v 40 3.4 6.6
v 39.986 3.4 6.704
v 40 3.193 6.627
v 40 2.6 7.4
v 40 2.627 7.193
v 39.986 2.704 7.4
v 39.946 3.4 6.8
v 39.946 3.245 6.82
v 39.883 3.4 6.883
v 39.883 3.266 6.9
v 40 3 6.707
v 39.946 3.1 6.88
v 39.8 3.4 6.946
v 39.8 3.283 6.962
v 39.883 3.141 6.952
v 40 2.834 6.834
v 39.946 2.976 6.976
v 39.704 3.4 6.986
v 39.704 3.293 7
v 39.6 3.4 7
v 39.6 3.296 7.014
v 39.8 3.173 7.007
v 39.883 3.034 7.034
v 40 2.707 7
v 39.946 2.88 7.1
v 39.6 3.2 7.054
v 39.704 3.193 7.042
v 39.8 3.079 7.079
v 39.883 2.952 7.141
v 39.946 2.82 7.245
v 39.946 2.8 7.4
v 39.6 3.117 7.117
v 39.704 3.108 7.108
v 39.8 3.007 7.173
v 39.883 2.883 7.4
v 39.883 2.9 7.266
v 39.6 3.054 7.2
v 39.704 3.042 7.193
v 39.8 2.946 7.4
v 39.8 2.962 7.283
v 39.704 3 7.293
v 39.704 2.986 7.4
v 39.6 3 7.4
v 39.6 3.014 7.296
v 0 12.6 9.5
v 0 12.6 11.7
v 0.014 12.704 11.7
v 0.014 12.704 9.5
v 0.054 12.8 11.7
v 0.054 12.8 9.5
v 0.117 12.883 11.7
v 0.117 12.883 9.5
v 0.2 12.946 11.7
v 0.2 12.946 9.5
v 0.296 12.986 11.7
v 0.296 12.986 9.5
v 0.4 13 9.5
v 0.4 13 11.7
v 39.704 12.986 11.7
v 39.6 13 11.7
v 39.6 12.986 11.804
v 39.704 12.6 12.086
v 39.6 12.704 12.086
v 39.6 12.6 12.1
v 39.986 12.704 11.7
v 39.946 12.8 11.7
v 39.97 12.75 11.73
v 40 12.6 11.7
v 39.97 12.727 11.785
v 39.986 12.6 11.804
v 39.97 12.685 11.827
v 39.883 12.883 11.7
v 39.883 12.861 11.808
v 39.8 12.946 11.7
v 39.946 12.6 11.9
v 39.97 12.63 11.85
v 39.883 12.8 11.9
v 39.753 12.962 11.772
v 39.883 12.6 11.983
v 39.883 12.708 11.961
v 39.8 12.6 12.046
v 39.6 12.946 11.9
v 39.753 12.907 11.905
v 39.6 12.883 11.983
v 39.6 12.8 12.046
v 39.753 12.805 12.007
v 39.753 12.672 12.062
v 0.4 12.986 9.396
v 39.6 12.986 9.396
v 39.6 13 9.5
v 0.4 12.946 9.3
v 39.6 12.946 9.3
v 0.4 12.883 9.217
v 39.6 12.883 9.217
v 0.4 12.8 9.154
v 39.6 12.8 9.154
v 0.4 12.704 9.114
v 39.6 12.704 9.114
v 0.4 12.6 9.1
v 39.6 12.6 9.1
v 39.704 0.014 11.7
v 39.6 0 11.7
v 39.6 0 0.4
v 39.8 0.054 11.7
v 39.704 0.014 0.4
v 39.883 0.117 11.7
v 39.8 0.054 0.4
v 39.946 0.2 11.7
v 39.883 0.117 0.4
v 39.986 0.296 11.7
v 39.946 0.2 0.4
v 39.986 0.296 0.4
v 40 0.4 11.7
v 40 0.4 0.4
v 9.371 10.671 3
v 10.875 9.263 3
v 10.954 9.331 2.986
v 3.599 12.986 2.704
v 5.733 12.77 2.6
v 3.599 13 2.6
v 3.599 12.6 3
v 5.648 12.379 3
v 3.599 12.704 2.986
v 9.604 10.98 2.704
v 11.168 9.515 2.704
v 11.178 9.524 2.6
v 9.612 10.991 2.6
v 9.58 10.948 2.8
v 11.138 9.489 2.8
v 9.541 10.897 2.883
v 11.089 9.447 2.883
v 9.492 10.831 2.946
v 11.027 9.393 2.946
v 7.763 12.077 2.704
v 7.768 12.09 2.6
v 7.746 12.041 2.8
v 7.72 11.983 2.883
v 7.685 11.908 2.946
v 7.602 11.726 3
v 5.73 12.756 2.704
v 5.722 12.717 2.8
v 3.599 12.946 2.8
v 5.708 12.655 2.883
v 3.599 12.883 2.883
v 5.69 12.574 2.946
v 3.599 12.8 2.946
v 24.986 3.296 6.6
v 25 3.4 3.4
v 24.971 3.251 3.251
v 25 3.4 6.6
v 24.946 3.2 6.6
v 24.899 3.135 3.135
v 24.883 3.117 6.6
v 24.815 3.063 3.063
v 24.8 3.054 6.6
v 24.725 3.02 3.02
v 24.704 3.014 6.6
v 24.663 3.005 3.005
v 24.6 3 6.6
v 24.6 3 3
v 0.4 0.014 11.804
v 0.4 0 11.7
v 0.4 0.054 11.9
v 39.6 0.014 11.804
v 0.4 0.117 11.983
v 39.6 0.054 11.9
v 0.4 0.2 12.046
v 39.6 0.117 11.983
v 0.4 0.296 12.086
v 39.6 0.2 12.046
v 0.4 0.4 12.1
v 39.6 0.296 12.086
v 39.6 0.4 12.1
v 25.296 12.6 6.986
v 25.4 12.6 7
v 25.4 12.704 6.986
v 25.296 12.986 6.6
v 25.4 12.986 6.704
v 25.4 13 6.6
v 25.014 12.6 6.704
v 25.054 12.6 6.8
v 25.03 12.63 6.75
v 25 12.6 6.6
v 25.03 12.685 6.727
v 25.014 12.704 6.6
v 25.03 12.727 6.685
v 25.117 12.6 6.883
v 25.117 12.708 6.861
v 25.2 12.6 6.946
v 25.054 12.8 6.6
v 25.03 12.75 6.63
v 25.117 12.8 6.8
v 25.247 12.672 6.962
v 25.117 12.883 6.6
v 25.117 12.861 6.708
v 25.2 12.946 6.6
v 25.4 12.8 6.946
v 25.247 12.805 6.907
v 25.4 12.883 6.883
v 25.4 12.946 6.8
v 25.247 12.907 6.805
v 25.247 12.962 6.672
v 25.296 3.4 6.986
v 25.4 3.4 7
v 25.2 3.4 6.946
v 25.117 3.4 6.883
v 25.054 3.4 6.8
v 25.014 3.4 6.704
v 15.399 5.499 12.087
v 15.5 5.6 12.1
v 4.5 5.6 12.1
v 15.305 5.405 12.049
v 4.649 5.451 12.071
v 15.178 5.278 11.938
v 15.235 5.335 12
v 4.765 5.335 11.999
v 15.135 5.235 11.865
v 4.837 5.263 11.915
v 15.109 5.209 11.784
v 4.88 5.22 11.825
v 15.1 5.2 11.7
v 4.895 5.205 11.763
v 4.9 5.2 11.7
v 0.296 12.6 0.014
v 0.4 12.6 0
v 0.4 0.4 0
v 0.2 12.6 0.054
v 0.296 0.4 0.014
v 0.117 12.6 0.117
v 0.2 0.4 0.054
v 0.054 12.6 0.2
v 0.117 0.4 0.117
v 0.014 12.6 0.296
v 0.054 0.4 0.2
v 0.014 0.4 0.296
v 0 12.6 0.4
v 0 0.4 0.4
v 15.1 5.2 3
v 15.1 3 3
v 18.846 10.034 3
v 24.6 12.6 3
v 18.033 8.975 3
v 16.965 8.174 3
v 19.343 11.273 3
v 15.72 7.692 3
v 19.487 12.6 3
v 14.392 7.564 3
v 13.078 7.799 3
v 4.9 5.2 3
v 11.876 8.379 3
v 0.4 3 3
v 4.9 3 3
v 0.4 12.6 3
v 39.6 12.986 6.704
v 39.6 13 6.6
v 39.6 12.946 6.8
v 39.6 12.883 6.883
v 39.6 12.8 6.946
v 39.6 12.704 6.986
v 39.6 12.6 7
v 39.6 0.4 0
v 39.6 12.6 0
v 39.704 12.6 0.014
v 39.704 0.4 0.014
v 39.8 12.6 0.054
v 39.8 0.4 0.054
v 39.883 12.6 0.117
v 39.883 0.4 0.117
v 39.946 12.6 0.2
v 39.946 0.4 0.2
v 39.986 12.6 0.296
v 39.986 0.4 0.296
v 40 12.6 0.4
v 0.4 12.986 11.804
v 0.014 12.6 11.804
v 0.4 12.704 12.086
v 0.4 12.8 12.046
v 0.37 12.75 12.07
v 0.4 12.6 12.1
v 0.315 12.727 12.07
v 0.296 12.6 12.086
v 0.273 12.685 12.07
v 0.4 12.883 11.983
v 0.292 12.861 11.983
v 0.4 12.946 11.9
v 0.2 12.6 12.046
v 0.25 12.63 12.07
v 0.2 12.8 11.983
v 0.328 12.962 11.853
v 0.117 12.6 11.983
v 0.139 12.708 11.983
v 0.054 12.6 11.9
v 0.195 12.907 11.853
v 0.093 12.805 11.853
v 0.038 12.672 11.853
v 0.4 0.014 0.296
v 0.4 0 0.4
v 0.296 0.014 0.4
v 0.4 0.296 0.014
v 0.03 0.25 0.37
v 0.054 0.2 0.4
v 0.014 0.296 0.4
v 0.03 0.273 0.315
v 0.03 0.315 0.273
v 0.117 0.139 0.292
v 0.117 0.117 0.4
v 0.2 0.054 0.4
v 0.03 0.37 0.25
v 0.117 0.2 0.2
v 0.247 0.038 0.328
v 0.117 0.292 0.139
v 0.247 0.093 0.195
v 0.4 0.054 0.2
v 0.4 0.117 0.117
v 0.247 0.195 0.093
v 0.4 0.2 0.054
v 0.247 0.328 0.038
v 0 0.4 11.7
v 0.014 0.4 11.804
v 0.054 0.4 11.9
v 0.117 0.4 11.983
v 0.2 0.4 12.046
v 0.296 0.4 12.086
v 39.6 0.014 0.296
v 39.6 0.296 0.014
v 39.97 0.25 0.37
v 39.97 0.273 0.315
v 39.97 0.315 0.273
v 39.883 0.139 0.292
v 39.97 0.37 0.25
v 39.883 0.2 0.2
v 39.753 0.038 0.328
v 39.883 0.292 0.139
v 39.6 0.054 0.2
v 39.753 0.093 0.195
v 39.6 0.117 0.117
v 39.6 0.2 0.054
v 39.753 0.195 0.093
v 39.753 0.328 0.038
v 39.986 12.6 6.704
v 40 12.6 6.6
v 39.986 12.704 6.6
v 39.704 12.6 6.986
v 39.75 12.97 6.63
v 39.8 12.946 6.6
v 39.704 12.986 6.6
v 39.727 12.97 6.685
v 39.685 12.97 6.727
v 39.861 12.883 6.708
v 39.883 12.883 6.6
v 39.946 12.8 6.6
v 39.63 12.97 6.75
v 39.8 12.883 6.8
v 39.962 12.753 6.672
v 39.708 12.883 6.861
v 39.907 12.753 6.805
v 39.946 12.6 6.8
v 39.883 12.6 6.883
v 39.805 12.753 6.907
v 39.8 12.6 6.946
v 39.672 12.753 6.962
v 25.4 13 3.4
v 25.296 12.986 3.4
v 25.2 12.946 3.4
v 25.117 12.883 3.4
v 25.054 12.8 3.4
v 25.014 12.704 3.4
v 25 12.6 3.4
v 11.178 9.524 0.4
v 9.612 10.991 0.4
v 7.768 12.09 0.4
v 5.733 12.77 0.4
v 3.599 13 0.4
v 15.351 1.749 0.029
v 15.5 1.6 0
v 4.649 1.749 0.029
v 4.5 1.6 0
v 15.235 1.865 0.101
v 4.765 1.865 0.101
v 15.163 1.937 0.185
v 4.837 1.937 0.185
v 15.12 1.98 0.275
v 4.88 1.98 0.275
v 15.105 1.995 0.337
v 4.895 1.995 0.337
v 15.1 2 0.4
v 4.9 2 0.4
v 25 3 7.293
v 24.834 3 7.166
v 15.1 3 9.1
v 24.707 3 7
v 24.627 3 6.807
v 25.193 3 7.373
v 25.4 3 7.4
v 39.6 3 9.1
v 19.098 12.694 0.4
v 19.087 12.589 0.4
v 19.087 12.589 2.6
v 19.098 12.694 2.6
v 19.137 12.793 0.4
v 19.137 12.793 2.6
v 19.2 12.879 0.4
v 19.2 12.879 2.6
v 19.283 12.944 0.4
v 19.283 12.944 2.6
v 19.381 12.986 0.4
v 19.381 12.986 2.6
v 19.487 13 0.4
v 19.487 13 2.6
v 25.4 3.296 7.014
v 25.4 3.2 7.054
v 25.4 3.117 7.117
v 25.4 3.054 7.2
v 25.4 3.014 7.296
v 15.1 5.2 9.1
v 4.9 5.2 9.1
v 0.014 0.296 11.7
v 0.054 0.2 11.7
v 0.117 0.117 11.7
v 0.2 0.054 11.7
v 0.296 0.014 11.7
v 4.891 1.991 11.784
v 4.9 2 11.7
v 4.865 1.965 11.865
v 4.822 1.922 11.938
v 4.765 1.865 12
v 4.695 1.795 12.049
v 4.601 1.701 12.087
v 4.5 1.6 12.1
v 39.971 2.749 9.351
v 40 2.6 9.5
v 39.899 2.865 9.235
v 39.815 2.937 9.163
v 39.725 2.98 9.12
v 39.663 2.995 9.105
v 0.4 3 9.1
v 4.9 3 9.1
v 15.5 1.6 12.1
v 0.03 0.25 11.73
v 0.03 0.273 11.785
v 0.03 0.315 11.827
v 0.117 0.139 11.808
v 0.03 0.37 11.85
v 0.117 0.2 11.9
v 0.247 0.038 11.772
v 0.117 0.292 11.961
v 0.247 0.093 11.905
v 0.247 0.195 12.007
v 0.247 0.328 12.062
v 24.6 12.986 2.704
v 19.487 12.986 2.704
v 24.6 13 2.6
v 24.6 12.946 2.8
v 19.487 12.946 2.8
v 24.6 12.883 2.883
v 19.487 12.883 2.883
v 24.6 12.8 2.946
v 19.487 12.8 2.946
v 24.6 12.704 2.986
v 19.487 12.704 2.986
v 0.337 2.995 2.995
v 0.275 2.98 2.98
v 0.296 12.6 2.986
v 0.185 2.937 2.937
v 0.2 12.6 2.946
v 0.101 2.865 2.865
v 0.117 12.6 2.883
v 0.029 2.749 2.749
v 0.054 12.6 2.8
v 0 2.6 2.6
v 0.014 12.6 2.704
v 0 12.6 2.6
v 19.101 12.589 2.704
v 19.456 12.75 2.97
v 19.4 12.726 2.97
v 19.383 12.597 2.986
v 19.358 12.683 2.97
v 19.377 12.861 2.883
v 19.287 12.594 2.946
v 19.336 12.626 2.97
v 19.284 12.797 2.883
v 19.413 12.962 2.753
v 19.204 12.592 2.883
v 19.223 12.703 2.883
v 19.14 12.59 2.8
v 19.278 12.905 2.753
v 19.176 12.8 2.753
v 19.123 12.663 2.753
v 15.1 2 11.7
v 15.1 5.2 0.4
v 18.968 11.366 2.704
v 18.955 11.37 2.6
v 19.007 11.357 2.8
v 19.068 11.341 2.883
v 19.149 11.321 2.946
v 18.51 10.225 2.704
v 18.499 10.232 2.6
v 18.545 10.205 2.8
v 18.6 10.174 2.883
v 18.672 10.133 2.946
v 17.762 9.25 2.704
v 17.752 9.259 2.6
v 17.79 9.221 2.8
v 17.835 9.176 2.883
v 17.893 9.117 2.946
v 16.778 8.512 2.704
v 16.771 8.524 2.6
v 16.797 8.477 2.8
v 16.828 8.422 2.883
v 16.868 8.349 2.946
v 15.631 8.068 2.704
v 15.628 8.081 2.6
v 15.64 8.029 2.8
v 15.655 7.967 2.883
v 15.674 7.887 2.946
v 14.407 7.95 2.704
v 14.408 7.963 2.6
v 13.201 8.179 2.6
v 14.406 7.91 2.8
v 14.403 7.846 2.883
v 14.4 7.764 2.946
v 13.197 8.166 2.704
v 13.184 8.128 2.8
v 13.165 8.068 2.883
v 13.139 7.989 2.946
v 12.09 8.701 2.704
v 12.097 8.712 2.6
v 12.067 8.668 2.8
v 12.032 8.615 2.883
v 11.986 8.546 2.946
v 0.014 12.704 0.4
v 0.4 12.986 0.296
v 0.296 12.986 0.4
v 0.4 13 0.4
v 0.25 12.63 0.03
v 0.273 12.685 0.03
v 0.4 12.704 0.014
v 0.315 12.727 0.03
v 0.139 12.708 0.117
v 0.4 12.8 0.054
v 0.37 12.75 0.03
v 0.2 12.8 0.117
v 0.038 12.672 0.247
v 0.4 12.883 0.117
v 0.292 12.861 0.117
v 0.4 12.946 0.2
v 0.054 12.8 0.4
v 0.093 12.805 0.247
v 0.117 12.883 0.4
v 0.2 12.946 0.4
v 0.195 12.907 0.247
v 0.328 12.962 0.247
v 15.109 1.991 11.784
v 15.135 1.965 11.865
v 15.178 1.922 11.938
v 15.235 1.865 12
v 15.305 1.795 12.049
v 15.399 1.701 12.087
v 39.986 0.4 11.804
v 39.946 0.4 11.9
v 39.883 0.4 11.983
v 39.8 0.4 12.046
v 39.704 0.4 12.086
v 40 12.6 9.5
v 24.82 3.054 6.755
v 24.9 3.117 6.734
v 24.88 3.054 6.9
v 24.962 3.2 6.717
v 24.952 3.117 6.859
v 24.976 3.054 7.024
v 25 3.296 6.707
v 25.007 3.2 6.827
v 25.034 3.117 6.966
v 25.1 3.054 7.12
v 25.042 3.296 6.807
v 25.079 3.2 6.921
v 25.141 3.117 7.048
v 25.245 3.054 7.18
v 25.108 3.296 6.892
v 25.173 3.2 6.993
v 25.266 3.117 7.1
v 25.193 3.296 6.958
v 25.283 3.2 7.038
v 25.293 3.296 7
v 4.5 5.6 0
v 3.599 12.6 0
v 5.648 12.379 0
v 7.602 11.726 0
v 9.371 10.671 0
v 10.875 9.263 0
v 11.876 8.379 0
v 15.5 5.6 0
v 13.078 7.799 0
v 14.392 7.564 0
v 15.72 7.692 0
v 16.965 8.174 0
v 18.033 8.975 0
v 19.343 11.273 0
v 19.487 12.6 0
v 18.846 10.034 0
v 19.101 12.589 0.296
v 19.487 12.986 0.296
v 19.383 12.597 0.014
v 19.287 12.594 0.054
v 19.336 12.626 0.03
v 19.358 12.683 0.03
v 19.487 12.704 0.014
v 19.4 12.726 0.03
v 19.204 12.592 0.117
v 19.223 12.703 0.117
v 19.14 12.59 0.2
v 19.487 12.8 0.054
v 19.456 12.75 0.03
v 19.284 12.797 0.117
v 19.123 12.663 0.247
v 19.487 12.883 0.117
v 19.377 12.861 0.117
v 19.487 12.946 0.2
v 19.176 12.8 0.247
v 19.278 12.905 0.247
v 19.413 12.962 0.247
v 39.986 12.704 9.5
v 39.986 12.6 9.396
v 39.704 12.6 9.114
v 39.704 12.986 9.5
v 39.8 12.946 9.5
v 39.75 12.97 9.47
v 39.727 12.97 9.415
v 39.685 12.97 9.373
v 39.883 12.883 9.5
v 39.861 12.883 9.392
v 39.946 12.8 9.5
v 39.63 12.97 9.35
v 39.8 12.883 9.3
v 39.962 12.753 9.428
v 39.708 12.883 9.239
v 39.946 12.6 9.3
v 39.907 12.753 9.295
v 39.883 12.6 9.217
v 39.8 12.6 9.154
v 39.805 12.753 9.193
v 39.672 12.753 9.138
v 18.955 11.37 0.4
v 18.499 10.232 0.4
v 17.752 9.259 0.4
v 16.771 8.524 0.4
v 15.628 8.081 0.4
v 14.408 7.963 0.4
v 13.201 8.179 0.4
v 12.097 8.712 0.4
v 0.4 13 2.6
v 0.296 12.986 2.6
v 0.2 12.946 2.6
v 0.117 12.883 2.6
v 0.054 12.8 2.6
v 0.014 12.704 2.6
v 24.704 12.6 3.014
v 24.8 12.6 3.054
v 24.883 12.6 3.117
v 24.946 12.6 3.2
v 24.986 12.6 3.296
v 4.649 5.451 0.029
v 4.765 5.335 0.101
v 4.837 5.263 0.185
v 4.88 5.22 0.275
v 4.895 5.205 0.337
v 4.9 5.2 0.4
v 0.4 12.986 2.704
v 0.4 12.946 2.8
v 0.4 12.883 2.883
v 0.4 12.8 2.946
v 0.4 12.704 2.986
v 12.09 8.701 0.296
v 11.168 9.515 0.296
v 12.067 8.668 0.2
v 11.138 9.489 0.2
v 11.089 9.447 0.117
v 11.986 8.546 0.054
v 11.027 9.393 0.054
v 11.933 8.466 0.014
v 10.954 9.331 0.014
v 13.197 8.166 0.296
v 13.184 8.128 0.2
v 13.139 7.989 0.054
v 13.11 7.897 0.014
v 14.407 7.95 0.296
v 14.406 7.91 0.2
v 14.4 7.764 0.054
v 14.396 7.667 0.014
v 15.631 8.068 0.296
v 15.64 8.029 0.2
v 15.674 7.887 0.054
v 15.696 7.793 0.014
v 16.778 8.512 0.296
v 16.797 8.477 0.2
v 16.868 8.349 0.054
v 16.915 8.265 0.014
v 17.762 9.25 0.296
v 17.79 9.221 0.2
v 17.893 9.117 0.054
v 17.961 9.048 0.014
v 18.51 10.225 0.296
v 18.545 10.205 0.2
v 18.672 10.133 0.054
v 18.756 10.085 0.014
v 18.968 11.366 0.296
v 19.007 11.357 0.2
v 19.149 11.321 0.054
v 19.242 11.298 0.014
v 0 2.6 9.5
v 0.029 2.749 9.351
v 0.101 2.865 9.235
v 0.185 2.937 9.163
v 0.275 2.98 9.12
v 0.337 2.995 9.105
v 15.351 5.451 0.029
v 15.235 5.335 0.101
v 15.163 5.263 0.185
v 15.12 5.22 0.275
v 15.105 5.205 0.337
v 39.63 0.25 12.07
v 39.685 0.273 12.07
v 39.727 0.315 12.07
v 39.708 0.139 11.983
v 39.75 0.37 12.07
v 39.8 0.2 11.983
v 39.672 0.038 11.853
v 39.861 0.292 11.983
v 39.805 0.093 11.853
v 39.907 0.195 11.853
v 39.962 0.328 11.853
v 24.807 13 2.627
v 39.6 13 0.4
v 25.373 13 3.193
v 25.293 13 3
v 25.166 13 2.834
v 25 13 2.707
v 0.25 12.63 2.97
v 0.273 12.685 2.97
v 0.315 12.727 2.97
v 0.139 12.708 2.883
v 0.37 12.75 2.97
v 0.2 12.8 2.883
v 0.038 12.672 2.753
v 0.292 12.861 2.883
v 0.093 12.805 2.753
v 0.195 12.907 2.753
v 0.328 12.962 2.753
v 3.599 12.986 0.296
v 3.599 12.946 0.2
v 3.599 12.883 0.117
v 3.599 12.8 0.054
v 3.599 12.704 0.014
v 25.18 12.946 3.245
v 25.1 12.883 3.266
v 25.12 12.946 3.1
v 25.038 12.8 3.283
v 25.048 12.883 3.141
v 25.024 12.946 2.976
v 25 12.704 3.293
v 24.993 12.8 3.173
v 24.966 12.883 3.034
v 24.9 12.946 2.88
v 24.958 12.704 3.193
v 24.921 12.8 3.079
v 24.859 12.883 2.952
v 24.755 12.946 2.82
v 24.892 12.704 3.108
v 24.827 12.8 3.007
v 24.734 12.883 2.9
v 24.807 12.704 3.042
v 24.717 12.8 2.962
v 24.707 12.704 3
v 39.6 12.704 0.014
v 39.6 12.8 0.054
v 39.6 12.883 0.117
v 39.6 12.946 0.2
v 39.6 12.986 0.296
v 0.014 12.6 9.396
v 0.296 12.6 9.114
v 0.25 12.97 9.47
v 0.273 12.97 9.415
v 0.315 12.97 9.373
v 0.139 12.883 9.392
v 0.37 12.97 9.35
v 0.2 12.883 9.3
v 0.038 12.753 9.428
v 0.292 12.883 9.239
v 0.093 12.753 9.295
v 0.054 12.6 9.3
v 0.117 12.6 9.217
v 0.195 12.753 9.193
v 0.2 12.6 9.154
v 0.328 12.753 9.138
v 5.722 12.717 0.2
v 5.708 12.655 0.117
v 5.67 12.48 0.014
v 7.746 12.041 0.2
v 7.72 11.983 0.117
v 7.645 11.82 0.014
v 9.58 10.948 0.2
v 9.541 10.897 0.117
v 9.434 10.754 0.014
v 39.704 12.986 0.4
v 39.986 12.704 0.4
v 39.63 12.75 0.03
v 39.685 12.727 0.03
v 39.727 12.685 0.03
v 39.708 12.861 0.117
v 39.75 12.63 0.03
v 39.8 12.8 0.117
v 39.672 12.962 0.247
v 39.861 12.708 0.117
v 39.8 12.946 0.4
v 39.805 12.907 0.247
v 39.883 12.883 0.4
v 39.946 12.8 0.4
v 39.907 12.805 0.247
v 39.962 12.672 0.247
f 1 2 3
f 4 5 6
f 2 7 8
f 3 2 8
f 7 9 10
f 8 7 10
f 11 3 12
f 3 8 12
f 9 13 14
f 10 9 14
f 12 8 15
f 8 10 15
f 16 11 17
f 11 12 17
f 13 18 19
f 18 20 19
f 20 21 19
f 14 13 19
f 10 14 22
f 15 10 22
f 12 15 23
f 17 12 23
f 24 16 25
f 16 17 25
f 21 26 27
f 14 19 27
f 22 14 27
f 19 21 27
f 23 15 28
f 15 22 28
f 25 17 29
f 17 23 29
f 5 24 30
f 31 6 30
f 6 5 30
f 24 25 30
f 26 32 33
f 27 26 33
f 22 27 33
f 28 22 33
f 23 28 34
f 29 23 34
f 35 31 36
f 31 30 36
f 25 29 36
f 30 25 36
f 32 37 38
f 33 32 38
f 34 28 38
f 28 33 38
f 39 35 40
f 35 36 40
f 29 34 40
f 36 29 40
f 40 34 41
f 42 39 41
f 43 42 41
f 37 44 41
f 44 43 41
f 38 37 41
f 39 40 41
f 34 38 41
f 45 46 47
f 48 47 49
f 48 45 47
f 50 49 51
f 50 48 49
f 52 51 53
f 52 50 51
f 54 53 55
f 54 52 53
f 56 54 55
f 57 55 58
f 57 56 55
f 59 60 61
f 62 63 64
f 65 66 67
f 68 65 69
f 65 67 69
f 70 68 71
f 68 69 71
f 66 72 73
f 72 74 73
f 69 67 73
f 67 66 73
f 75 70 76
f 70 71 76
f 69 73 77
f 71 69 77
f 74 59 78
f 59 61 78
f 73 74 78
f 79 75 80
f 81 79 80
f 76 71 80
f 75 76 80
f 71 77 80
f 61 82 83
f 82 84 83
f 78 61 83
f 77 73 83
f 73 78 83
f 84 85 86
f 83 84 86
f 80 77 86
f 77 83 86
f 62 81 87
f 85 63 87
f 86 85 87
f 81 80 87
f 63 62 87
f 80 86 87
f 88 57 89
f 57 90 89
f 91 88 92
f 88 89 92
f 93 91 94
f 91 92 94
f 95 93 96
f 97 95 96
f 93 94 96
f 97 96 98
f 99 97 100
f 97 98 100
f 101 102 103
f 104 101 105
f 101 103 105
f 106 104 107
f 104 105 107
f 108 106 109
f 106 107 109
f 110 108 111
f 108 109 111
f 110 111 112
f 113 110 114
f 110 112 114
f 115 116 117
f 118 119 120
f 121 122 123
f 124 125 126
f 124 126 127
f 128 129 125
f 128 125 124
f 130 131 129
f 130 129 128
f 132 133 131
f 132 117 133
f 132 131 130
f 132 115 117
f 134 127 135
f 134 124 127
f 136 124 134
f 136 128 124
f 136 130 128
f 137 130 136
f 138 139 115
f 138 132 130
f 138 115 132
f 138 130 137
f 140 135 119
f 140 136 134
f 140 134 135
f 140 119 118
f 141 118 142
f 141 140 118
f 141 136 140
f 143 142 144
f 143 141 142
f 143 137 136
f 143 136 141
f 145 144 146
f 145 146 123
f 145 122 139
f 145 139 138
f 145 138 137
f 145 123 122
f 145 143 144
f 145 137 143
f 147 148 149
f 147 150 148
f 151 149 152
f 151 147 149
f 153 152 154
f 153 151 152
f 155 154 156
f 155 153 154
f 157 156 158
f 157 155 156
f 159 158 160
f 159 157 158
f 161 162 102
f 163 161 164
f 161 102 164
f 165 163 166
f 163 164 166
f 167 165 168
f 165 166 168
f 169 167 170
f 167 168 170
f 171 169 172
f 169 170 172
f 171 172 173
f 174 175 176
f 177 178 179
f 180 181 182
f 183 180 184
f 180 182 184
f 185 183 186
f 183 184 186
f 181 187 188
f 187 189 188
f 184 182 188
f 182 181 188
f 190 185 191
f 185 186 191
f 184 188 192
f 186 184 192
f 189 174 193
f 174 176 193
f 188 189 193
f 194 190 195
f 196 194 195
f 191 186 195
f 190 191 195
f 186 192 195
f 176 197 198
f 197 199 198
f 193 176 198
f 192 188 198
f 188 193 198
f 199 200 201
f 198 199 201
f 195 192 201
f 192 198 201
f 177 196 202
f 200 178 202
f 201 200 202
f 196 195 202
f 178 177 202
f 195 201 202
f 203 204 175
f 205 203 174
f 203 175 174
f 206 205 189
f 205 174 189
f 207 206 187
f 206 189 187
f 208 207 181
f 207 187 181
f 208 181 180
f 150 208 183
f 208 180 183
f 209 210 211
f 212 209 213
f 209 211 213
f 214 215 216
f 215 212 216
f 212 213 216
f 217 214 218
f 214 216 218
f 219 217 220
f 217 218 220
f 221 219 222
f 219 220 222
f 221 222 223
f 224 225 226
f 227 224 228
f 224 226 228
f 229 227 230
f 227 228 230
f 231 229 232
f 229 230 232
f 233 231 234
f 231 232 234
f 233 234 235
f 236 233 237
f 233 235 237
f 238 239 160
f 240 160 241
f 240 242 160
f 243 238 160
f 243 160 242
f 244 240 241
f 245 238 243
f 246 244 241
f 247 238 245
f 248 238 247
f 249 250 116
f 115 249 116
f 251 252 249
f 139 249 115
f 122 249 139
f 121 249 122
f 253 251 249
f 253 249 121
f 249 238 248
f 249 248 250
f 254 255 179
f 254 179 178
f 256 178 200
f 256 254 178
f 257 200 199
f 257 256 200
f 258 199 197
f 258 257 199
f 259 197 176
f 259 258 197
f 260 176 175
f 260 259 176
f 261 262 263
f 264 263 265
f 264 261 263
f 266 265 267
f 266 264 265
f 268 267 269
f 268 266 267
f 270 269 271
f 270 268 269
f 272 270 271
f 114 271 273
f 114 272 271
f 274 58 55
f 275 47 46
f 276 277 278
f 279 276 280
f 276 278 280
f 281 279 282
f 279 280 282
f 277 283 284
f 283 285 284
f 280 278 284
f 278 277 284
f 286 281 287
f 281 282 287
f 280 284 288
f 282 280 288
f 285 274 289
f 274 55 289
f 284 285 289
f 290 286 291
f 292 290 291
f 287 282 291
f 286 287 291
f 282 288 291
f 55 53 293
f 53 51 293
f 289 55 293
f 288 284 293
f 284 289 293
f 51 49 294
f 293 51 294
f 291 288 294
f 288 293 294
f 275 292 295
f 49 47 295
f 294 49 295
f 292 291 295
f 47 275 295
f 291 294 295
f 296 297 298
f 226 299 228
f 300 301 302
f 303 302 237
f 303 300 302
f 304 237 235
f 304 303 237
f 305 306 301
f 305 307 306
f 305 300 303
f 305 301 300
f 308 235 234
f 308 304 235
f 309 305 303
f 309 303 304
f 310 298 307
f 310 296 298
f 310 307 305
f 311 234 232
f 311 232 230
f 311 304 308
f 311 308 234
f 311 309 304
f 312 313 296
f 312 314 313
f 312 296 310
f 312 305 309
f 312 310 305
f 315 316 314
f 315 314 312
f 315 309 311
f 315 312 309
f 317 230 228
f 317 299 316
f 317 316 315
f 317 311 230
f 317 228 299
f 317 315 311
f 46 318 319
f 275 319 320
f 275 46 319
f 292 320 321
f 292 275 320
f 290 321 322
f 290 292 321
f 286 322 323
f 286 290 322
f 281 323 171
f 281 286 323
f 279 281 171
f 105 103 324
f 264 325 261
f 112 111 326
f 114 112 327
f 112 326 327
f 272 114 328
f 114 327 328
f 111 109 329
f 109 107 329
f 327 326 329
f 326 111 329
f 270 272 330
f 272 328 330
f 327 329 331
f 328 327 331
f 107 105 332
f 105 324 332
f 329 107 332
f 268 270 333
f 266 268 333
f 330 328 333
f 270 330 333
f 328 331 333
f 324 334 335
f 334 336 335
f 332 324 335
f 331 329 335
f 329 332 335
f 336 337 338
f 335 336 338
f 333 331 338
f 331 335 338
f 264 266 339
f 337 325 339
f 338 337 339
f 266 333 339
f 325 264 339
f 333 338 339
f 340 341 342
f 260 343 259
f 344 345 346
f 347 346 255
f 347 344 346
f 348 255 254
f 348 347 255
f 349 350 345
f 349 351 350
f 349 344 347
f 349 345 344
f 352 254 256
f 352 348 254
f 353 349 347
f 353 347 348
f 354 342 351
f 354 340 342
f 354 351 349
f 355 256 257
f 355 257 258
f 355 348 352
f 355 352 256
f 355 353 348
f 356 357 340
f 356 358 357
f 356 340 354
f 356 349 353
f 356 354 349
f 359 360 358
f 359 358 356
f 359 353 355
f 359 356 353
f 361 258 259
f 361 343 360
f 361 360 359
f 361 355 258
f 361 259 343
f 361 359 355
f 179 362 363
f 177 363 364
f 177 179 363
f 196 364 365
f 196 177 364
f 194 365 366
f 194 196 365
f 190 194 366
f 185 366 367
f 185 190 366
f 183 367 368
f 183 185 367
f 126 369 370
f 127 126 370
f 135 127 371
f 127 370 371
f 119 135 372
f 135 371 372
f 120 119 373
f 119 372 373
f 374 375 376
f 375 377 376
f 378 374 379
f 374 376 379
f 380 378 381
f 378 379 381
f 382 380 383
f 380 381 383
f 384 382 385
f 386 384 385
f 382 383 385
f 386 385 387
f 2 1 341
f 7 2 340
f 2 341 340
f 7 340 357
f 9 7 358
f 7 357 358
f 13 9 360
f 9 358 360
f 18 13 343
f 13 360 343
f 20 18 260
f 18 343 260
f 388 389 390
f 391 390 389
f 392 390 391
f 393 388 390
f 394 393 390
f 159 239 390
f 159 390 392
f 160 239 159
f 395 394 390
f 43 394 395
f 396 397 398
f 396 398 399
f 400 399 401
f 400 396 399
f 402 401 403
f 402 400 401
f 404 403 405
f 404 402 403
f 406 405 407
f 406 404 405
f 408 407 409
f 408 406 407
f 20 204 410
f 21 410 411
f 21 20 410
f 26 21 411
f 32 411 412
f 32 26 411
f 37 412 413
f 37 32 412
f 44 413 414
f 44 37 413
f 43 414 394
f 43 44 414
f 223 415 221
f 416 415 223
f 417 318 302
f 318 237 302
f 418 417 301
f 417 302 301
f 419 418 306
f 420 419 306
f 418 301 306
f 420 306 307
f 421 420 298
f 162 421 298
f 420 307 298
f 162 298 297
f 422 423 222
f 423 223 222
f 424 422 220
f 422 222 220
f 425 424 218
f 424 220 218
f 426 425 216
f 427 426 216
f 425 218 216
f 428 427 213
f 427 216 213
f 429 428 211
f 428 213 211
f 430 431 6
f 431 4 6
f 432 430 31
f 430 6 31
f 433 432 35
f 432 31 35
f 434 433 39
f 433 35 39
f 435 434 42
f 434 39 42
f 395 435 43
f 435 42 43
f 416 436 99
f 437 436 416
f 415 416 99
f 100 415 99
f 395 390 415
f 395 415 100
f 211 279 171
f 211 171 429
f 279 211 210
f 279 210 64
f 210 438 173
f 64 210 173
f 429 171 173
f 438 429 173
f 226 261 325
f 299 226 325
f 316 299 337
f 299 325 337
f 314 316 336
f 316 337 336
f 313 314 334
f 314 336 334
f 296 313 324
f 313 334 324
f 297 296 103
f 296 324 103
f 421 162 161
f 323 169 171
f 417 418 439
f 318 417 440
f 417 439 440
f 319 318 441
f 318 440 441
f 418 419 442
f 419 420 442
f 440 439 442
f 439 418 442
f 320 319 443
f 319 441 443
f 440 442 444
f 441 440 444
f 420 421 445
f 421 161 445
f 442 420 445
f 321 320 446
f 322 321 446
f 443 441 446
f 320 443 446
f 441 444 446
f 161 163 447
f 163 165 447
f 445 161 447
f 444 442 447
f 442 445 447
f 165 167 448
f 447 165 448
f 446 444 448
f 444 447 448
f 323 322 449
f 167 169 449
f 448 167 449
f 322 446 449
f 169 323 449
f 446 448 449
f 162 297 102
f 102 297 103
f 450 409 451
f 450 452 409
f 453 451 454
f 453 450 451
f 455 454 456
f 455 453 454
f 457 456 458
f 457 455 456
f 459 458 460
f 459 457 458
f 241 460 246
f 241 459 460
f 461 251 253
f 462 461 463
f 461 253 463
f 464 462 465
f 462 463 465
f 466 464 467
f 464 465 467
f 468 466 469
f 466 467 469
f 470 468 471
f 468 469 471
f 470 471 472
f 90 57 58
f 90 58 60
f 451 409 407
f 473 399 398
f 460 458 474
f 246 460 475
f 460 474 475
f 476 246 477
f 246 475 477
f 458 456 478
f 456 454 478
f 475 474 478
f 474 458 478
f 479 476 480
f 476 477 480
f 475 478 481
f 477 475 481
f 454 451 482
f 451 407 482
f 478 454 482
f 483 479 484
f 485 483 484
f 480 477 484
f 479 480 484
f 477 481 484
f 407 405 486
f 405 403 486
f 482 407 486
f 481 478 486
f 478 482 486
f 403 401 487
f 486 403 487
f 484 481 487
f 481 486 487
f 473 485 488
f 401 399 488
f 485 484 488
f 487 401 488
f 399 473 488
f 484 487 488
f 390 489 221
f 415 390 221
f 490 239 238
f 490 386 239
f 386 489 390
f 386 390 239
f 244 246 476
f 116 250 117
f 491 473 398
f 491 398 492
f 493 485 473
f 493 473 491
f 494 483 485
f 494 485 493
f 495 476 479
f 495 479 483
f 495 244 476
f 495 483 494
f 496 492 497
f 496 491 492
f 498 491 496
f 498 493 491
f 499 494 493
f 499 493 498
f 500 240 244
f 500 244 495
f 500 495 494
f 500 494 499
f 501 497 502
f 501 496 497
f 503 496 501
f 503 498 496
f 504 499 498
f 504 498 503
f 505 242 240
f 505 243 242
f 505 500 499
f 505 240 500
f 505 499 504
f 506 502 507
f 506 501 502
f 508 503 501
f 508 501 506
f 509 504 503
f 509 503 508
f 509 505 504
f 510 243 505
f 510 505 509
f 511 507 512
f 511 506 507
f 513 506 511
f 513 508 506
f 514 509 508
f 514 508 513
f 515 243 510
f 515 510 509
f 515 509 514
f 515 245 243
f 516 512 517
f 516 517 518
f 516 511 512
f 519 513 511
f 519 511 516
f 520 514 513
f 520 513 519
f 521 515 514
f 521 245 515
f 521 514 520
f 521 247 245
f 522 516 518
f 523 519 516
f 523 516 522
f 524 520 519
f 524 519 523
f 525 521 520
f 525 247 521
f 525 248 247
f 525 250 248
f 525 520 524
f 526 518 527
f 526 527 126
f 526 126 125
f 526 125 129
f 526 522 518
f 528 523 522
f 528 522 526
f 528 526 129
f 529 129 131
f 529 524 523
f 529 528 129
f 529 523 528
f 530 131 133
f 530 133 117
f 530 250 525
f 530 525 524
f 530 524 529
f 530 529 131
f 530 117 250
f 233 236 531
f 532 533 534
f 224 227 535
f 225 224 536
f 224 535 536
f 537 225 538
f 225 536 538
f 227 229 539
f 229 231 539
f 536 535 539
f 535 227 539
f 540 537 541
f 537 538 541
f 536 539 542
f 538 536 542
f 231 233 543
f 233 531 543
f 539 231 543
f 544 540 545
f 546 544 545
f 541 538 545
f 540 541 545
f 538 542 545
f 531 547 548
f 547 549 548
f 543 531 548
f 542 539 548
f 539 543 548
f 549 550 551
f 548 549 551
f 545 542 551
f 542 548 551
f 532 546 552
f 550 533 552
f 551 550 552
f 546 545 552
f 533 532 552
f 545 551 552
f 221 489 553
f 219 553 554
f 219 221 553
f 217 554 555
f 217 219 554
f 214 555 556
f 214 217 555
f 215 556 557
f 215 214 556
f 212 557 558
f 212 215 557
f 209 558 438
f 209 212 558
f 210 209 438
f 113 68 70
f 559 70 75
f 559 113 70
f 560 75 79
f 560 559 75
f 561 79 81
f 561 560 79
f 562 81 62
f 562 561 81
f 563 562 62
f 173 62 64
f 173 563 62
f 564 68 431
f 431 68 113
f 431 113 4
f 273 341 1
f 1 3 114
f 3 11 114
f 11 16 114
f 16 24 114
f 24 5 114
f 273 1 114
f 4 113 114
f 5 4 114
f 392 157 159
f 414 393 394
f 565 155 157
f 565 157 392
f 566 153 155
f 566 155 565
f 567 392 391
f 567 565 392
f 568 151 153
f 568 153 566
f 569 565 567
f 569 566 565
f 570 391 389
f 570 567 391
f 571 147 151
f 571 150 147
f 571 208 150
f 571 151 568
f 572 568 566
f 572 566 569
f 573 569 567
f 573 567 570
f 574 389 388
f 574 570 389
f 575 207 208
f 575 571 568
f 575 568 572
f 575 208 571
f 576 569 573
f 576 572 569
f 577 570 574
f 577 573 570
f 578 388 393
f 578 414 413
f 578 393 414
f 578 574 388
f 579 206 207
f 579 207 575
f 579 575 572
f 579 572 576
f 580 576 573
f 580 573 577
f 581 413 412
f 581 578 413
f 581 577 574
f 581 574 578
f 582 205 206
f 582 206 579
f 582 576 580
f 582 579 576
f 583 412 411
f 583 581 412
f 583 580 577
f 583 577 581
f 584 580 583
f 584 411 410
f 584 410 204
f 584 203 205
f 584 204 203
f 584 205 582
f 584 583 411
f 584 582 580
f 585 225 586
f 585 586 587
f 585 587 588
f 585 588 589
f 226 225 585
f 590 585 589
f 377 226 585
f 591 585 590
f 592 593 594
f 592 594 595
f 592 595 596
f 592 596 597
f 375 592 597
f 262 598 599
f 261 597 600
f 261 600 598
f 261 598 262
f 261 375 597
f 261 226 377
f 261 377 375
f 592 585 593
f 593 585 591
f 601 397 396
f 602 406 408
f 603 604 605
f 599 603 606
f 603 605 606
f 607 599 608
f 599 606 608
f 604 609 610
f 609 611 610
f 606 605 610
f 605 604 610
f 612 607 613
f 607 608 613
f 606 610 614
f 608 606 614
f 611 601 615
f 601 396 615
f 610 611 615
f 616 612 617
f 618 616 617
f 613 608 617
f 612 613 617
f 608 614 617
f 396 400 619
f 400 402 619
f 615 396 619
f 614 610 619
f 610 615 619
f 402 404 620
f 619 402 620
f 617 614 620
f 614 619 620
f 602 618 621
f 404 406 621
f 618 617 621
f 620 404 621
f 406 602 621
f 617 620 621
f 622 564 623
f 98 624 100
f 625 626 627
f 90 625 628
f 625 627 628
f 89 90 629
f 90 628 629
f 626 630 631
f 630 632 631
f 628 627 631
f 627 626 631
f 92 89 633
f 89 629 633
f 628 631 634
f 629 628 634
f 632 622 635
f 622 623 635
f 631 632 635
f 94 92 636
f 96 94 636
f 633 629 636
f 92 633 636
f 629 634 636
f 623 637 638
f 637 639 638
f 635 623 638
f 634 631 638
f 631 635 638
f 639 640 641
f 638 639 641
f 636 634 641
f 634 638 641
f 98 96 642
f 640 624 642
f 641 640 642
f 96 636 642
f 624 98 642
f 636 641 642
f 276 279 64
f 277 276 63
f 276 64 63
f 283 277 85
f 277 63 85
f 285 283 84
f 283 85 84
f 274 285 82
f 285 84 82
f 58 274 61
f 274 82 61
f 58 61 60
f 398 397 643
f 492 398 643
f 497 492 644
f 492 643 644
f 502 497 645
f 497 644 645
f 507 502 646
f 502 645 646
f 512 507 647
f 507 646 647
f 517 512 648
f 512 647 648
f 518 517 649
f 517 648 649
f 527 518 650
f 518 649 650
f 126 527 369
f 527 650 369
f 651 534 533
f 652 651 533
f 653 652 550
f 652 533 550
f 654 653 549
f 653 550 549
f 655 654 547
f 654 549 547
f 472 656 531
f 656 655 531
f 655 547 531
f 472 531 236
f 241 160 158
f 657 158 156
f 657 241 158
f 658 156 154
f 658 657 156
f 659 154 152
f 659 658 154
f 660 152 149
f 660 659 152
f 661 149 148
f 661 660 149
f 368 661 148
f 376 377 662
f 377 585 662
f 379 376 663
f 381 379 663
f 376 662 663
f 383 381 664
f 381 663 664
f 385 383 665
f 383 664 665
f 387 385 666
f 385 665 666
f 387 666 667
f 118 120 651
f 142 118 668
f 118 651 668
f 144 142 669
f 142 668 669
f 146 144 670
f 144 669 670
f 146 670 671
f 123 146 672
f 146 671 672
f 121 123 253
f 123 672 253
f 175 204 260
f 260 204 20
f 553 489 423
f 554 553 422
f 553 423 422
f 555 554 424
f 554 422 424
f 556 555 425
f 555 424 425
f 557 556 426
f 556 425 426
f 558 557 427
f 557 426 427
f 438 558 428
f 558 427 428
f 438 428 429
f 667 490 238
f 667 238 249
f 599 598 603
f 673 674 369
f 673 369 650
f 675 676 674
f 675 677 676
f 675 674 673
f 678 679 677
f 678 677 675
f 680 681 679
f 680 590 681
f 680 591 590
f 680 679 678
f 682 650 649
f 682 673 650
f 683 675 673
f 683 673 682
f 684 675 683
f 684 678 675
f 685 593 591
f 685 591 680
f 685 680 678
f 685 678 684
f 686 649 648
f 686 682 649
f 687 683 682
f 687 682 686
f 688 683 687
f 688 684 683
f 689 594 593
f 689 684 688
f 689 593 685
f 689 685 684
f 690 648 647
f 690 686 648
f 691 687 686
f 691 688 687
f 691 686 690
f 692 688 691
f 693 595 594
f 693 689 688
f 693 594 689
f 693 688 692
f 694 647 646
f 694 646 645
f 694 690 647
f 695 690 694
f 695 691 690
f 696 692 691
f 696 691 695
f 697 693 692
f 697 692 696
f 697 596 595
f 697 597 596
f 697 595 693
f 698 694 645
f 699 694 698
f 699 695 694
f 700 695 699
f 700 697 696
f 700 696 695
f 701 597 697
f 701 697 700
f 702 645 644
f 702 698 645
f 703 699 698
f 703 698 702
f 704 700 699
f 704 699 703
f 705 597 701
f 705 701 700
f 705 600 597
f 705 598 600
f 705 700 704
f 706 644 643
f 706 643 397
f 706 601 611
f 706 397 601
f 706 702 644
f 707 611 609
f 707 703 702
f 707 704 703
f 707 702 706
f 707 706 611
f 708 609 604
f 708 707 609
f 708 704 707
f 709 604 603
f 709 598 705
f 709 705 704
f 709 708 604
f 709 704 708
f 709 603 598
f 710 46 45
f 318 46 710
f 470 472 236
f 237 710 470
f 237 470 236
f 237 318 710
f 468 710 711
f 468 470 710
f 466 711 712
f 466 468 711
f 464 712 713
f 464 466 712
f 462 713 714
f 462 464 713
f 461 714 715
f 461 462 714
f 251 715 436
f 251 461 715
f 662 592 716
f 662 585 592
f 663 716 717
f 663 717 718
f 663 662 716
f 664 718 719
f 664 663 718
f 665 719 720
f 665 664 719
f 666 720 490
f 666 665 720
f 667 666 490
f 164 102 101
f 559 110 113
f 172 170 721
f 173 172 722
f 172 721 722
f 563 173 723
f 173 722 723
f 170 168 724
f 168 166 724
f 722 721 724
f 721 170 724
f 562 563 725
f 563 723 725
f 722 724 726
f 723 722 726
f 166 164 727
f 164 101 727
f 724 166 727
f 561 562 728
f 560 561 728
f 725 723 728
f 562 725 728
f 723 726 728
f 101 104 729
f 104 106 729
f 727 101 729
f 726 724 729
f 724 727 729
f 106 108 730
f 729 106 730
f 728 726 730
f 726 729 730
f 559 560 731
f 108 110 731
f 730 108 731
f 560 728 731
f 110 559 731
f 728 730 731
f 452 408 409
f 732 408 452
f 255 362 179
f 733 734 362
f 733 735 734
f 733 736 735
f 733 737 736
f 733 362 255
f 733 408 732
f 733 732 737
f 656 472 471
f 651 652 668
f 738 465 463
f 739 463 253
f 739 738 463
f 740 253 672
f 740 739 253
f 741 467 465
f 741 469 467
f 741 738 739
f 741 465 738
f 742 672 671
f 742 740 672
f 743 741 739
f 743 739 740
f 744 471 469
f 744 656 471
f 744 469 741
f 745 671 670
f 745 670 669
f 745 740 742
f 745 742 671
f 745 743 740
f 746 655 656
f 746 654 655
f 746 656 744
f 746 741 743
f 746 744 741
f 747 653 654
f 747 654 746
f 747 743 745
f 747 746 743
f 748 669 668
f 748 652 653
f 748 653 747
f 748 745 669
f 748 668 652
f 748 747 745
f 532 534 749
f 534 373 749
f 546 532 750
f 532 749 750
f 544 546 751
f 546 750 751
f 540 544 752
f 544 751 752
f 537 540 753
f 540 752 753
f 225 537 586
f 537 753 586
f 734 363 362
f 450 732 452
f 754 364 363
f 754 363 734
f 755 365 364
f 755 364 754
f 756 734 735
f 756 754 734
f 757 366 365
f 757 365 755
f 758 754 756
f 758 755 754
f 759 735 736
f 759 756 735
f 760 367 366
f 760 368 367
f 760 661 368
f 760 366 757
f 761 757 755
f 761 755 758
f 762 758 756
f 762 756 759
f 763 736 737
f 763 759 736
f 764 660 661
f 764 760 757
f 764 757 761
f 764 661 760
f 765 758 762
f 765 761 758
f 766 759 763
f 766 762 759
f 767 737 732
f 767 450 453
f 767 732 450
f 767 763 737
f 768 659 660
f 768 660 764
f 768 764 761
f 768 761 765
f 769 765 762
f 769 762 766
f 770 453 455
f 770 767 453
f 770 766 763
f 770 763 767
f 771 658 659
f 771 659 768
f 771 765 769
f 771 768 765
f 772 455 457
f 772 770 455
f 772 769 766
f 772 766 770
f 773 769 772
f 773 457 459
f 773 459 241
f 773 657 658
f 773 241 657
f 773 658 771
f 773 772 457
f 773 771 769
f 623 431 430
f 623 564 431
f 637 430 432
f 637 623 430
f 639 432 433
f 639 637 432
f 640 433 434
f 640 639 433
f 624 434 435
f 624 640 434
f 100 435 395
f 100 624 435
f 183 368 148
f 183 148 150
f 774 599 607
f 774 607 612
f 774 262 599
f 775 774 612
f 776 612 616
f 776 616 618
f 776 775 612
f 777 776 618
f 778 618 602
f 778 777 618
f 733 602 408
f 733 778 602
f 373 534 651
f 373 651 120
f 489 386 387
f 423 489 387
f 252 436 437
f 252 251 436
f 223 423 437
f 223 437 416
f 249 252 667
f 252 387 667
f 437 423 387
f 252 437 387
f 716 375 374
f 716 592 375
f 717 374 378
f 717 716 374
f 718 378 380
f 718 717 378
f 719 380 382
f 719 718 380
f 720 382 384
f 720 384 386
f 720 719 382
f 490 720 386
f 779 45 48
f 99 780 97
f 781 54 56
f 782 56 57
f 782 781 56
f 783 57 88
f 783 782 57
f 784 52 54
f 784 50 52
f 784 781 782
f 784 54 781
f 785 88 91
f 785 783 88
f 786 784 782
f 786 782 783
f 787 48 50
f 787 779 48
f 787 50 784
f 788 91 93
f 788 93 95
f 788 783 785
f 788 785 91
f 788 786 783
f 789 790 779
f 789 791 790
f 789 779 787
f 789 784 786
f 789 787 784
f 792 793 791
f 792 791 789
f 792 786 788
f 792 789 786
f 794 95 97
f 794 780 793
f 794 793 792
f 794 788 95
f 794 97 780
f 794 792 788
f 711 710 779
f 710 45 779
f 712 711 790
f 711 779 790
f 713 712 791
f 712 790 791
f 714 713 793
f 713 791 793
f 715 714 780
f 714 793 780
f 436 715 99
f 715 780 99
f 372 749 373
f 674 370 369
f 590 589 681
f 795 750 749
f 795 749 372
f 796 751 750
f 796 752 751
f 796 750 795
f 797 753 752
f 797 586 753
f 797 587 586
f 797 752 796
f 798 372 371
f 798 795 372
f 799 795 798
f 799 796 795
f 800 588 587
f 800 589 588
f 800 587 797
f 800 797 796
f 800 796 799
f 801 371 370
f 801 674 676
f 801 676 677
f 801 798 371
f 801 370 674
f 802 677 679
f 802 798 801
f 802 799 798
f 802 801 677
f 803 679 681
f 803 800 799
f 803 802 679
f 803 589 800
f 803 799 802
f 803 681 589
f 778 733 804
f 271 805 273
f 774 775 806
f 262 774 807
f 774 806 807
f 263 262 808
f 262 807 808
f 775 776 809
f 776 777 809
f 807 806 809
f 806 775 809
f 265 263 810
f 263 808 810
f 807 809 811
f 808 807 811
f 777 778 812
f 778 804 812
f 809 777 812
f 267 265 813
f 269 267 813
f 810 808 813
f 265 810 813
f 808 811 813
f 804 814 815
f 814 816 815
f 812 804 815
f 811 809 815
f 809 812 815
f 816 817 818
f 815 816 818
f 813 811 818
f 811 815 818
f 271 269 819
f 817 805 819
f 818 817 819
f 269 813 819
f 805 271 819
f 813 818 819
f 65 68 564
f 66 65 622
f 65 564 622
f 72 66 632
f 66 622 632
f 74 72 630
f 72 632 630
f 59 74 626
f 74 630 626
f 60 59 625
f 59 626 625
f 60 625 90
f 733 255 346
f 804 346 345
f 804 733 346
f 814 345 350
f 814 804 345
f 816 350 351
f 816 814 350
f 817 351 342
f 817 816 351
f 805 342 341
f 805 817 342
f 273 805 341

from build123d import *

# Parameters (mm, degrees)
SKETCH1_W           = 40
SKETCH1_H           = 12.1
BOSS_EXTRUDE1_DEPTH = 3
SKETCH2_W           = 40
SKETCH2_H           = 7
SKETCH2_H_2         = 3
BOSS_EXTRUDE2_DEPTH = 10
SKETCH3_W           = 10.2
SKETCH3_H           = 3.2
CUT_EXTRUDE1_DEPTH  = 44.765397291
SKETCH5_W           = 4
SKETCH5_H           = 10
CUT_EXTRUDE3_DEPTH  = 25
SKETCH6_R           = 4.5
CUT_EXTRUDE4_DEPTH  = 3
FILLET3_R           = 10
FILLET1_R           = 0.4


with BuildPart() as part:
    # Sketch1 → Boss-Extrude1 (new body)
    with BuildSketch(Plane(origin=(0, 0, 0), x_dir=(1, 0, 0), z_dir=(0, 1, 0))):
        with Locations((20, -6.05)):
            Rectangle(SKETCH1_W, SKETCH1_H)
    extrude(amount=BOSS_EXTRUDE1_DEPTH)

    # Sketch2 → Boss-Extrude2 (add)
    with BuildSketch(Plane(origin=(0, 3, 0), x_dir=(1, 0, 0), z_dir=(0, 1, 0))):
        with Locations((20, -3.5)):
            Rectangle(SKETCH2_W, SKETCH2_H)
        with Locations((20, -10.6)):
            Rectangle(SKETCH2_W, SKETCH2_H_2)
    extrude(amount=BOSS_EXTRUDE2_DEPTH)

    # Sketch3 → Cut-Extrude1 (cut, through all)
    with BuildSketch(Plane(origin=(0, 0, 0), x_dir=(-1, 0, 0), z_dir=(0, 0, -1))):
        with Locations((-10, 3.6)):
            Rectangle(SKETCH3_W, SKETCH3_H)
    extrude(amount=-CUT_EXTRUDE1_DEPTH, mode=Mode.SUBTRACT)

    # Sketch5 → Cut-Extrude3 (cut)
    with BuildSketch(Plane.ZY):
        with Locations((5, 8)):
            Rectangle(SKETCH5_W, SKETCH5_H)
    extrude(amount=-CUT_EXTRUDE3_DEPTH, mode=Mode.SUBTRACT)

    # Sketch6 → Cut-Extrude4 (cut)
    with BuildSketch(Plane(origin=(0, 0, 0), x_dir=(-1, 0, 0), z_dir=(0, 0, -1))):
        with Locations((-14.588737144, 12.45970207)):
            Circle(SKETCH6_R)
    extrude(amount=-CUT_EXTRUDE4_DEPTH, mode=Mode.SUBTRACT)

    # Fillet3
    fillet3_edges = [part.edges().sort_by_distance(p)[0] for p in [
        (10.121290653, 13, 1.5),
    ]]
    fillet(fillet3_edges, radius=FILLET3_R)

    # Fillet1
    fillet1_edges = [part.edges().sort_by_distance(p)[0] for p in [
        (0, 3, 6.05),
        (40, 8, 7),
        (0, 13, 1.5),
        (40, 13, 3.5),
        (29.528091817, 13, 0),
        (40, 3, 8.05),
        (0, 8, 9.1),
        (40, 8, 9.1),
        (0, 13, 10.6),
        (20, 13, 12.1),
        (40, 13, 10.6),
        (20, 13, 9.1),
        (15.1, 3.6, 12.1),
        (10, 5.2, 12.1),
        (4.9, 3.6, 12.1),
        (10, 2, 12.1),
        (15.1, 3.6, 0),
        (10, 2, 0),
        (4.9, 3.6, 0),
        (20, 0, 0),
        (10, 5.2, 0),
        (40, 0, 6.05),
        (20, 0, 12.1),
        (0, 0, 6.05),
        (32.5, 13, 7),
        (32.5, 3, 7),
        (25, 8, 7),
        (25, 3, 5),
        (25, 8, 3),
        (25, 13, 5),
        (22.028091817, 13, 3),
        (0, 8, 3),
        (0, 6.5, 0),
        (40, 6.5, 0),
        (40, 6.5, 12.1),
        (0, 6.5, 12.1),
        (16.405345244, 8.342672193, 3),
        (19.056183635, 13, 1.5),
        (16.405345244, 8.342672193, 0),
        (1.79973399, 13, 3),
        (7.768441198, 12.089535869, 3),
        (1.79973399, 13, 0),
        (7.768441198, 12.089535869, 0),
    ]]
    fillet(fillet1_edges, radius=FILLET1_R)


solid = part.part
